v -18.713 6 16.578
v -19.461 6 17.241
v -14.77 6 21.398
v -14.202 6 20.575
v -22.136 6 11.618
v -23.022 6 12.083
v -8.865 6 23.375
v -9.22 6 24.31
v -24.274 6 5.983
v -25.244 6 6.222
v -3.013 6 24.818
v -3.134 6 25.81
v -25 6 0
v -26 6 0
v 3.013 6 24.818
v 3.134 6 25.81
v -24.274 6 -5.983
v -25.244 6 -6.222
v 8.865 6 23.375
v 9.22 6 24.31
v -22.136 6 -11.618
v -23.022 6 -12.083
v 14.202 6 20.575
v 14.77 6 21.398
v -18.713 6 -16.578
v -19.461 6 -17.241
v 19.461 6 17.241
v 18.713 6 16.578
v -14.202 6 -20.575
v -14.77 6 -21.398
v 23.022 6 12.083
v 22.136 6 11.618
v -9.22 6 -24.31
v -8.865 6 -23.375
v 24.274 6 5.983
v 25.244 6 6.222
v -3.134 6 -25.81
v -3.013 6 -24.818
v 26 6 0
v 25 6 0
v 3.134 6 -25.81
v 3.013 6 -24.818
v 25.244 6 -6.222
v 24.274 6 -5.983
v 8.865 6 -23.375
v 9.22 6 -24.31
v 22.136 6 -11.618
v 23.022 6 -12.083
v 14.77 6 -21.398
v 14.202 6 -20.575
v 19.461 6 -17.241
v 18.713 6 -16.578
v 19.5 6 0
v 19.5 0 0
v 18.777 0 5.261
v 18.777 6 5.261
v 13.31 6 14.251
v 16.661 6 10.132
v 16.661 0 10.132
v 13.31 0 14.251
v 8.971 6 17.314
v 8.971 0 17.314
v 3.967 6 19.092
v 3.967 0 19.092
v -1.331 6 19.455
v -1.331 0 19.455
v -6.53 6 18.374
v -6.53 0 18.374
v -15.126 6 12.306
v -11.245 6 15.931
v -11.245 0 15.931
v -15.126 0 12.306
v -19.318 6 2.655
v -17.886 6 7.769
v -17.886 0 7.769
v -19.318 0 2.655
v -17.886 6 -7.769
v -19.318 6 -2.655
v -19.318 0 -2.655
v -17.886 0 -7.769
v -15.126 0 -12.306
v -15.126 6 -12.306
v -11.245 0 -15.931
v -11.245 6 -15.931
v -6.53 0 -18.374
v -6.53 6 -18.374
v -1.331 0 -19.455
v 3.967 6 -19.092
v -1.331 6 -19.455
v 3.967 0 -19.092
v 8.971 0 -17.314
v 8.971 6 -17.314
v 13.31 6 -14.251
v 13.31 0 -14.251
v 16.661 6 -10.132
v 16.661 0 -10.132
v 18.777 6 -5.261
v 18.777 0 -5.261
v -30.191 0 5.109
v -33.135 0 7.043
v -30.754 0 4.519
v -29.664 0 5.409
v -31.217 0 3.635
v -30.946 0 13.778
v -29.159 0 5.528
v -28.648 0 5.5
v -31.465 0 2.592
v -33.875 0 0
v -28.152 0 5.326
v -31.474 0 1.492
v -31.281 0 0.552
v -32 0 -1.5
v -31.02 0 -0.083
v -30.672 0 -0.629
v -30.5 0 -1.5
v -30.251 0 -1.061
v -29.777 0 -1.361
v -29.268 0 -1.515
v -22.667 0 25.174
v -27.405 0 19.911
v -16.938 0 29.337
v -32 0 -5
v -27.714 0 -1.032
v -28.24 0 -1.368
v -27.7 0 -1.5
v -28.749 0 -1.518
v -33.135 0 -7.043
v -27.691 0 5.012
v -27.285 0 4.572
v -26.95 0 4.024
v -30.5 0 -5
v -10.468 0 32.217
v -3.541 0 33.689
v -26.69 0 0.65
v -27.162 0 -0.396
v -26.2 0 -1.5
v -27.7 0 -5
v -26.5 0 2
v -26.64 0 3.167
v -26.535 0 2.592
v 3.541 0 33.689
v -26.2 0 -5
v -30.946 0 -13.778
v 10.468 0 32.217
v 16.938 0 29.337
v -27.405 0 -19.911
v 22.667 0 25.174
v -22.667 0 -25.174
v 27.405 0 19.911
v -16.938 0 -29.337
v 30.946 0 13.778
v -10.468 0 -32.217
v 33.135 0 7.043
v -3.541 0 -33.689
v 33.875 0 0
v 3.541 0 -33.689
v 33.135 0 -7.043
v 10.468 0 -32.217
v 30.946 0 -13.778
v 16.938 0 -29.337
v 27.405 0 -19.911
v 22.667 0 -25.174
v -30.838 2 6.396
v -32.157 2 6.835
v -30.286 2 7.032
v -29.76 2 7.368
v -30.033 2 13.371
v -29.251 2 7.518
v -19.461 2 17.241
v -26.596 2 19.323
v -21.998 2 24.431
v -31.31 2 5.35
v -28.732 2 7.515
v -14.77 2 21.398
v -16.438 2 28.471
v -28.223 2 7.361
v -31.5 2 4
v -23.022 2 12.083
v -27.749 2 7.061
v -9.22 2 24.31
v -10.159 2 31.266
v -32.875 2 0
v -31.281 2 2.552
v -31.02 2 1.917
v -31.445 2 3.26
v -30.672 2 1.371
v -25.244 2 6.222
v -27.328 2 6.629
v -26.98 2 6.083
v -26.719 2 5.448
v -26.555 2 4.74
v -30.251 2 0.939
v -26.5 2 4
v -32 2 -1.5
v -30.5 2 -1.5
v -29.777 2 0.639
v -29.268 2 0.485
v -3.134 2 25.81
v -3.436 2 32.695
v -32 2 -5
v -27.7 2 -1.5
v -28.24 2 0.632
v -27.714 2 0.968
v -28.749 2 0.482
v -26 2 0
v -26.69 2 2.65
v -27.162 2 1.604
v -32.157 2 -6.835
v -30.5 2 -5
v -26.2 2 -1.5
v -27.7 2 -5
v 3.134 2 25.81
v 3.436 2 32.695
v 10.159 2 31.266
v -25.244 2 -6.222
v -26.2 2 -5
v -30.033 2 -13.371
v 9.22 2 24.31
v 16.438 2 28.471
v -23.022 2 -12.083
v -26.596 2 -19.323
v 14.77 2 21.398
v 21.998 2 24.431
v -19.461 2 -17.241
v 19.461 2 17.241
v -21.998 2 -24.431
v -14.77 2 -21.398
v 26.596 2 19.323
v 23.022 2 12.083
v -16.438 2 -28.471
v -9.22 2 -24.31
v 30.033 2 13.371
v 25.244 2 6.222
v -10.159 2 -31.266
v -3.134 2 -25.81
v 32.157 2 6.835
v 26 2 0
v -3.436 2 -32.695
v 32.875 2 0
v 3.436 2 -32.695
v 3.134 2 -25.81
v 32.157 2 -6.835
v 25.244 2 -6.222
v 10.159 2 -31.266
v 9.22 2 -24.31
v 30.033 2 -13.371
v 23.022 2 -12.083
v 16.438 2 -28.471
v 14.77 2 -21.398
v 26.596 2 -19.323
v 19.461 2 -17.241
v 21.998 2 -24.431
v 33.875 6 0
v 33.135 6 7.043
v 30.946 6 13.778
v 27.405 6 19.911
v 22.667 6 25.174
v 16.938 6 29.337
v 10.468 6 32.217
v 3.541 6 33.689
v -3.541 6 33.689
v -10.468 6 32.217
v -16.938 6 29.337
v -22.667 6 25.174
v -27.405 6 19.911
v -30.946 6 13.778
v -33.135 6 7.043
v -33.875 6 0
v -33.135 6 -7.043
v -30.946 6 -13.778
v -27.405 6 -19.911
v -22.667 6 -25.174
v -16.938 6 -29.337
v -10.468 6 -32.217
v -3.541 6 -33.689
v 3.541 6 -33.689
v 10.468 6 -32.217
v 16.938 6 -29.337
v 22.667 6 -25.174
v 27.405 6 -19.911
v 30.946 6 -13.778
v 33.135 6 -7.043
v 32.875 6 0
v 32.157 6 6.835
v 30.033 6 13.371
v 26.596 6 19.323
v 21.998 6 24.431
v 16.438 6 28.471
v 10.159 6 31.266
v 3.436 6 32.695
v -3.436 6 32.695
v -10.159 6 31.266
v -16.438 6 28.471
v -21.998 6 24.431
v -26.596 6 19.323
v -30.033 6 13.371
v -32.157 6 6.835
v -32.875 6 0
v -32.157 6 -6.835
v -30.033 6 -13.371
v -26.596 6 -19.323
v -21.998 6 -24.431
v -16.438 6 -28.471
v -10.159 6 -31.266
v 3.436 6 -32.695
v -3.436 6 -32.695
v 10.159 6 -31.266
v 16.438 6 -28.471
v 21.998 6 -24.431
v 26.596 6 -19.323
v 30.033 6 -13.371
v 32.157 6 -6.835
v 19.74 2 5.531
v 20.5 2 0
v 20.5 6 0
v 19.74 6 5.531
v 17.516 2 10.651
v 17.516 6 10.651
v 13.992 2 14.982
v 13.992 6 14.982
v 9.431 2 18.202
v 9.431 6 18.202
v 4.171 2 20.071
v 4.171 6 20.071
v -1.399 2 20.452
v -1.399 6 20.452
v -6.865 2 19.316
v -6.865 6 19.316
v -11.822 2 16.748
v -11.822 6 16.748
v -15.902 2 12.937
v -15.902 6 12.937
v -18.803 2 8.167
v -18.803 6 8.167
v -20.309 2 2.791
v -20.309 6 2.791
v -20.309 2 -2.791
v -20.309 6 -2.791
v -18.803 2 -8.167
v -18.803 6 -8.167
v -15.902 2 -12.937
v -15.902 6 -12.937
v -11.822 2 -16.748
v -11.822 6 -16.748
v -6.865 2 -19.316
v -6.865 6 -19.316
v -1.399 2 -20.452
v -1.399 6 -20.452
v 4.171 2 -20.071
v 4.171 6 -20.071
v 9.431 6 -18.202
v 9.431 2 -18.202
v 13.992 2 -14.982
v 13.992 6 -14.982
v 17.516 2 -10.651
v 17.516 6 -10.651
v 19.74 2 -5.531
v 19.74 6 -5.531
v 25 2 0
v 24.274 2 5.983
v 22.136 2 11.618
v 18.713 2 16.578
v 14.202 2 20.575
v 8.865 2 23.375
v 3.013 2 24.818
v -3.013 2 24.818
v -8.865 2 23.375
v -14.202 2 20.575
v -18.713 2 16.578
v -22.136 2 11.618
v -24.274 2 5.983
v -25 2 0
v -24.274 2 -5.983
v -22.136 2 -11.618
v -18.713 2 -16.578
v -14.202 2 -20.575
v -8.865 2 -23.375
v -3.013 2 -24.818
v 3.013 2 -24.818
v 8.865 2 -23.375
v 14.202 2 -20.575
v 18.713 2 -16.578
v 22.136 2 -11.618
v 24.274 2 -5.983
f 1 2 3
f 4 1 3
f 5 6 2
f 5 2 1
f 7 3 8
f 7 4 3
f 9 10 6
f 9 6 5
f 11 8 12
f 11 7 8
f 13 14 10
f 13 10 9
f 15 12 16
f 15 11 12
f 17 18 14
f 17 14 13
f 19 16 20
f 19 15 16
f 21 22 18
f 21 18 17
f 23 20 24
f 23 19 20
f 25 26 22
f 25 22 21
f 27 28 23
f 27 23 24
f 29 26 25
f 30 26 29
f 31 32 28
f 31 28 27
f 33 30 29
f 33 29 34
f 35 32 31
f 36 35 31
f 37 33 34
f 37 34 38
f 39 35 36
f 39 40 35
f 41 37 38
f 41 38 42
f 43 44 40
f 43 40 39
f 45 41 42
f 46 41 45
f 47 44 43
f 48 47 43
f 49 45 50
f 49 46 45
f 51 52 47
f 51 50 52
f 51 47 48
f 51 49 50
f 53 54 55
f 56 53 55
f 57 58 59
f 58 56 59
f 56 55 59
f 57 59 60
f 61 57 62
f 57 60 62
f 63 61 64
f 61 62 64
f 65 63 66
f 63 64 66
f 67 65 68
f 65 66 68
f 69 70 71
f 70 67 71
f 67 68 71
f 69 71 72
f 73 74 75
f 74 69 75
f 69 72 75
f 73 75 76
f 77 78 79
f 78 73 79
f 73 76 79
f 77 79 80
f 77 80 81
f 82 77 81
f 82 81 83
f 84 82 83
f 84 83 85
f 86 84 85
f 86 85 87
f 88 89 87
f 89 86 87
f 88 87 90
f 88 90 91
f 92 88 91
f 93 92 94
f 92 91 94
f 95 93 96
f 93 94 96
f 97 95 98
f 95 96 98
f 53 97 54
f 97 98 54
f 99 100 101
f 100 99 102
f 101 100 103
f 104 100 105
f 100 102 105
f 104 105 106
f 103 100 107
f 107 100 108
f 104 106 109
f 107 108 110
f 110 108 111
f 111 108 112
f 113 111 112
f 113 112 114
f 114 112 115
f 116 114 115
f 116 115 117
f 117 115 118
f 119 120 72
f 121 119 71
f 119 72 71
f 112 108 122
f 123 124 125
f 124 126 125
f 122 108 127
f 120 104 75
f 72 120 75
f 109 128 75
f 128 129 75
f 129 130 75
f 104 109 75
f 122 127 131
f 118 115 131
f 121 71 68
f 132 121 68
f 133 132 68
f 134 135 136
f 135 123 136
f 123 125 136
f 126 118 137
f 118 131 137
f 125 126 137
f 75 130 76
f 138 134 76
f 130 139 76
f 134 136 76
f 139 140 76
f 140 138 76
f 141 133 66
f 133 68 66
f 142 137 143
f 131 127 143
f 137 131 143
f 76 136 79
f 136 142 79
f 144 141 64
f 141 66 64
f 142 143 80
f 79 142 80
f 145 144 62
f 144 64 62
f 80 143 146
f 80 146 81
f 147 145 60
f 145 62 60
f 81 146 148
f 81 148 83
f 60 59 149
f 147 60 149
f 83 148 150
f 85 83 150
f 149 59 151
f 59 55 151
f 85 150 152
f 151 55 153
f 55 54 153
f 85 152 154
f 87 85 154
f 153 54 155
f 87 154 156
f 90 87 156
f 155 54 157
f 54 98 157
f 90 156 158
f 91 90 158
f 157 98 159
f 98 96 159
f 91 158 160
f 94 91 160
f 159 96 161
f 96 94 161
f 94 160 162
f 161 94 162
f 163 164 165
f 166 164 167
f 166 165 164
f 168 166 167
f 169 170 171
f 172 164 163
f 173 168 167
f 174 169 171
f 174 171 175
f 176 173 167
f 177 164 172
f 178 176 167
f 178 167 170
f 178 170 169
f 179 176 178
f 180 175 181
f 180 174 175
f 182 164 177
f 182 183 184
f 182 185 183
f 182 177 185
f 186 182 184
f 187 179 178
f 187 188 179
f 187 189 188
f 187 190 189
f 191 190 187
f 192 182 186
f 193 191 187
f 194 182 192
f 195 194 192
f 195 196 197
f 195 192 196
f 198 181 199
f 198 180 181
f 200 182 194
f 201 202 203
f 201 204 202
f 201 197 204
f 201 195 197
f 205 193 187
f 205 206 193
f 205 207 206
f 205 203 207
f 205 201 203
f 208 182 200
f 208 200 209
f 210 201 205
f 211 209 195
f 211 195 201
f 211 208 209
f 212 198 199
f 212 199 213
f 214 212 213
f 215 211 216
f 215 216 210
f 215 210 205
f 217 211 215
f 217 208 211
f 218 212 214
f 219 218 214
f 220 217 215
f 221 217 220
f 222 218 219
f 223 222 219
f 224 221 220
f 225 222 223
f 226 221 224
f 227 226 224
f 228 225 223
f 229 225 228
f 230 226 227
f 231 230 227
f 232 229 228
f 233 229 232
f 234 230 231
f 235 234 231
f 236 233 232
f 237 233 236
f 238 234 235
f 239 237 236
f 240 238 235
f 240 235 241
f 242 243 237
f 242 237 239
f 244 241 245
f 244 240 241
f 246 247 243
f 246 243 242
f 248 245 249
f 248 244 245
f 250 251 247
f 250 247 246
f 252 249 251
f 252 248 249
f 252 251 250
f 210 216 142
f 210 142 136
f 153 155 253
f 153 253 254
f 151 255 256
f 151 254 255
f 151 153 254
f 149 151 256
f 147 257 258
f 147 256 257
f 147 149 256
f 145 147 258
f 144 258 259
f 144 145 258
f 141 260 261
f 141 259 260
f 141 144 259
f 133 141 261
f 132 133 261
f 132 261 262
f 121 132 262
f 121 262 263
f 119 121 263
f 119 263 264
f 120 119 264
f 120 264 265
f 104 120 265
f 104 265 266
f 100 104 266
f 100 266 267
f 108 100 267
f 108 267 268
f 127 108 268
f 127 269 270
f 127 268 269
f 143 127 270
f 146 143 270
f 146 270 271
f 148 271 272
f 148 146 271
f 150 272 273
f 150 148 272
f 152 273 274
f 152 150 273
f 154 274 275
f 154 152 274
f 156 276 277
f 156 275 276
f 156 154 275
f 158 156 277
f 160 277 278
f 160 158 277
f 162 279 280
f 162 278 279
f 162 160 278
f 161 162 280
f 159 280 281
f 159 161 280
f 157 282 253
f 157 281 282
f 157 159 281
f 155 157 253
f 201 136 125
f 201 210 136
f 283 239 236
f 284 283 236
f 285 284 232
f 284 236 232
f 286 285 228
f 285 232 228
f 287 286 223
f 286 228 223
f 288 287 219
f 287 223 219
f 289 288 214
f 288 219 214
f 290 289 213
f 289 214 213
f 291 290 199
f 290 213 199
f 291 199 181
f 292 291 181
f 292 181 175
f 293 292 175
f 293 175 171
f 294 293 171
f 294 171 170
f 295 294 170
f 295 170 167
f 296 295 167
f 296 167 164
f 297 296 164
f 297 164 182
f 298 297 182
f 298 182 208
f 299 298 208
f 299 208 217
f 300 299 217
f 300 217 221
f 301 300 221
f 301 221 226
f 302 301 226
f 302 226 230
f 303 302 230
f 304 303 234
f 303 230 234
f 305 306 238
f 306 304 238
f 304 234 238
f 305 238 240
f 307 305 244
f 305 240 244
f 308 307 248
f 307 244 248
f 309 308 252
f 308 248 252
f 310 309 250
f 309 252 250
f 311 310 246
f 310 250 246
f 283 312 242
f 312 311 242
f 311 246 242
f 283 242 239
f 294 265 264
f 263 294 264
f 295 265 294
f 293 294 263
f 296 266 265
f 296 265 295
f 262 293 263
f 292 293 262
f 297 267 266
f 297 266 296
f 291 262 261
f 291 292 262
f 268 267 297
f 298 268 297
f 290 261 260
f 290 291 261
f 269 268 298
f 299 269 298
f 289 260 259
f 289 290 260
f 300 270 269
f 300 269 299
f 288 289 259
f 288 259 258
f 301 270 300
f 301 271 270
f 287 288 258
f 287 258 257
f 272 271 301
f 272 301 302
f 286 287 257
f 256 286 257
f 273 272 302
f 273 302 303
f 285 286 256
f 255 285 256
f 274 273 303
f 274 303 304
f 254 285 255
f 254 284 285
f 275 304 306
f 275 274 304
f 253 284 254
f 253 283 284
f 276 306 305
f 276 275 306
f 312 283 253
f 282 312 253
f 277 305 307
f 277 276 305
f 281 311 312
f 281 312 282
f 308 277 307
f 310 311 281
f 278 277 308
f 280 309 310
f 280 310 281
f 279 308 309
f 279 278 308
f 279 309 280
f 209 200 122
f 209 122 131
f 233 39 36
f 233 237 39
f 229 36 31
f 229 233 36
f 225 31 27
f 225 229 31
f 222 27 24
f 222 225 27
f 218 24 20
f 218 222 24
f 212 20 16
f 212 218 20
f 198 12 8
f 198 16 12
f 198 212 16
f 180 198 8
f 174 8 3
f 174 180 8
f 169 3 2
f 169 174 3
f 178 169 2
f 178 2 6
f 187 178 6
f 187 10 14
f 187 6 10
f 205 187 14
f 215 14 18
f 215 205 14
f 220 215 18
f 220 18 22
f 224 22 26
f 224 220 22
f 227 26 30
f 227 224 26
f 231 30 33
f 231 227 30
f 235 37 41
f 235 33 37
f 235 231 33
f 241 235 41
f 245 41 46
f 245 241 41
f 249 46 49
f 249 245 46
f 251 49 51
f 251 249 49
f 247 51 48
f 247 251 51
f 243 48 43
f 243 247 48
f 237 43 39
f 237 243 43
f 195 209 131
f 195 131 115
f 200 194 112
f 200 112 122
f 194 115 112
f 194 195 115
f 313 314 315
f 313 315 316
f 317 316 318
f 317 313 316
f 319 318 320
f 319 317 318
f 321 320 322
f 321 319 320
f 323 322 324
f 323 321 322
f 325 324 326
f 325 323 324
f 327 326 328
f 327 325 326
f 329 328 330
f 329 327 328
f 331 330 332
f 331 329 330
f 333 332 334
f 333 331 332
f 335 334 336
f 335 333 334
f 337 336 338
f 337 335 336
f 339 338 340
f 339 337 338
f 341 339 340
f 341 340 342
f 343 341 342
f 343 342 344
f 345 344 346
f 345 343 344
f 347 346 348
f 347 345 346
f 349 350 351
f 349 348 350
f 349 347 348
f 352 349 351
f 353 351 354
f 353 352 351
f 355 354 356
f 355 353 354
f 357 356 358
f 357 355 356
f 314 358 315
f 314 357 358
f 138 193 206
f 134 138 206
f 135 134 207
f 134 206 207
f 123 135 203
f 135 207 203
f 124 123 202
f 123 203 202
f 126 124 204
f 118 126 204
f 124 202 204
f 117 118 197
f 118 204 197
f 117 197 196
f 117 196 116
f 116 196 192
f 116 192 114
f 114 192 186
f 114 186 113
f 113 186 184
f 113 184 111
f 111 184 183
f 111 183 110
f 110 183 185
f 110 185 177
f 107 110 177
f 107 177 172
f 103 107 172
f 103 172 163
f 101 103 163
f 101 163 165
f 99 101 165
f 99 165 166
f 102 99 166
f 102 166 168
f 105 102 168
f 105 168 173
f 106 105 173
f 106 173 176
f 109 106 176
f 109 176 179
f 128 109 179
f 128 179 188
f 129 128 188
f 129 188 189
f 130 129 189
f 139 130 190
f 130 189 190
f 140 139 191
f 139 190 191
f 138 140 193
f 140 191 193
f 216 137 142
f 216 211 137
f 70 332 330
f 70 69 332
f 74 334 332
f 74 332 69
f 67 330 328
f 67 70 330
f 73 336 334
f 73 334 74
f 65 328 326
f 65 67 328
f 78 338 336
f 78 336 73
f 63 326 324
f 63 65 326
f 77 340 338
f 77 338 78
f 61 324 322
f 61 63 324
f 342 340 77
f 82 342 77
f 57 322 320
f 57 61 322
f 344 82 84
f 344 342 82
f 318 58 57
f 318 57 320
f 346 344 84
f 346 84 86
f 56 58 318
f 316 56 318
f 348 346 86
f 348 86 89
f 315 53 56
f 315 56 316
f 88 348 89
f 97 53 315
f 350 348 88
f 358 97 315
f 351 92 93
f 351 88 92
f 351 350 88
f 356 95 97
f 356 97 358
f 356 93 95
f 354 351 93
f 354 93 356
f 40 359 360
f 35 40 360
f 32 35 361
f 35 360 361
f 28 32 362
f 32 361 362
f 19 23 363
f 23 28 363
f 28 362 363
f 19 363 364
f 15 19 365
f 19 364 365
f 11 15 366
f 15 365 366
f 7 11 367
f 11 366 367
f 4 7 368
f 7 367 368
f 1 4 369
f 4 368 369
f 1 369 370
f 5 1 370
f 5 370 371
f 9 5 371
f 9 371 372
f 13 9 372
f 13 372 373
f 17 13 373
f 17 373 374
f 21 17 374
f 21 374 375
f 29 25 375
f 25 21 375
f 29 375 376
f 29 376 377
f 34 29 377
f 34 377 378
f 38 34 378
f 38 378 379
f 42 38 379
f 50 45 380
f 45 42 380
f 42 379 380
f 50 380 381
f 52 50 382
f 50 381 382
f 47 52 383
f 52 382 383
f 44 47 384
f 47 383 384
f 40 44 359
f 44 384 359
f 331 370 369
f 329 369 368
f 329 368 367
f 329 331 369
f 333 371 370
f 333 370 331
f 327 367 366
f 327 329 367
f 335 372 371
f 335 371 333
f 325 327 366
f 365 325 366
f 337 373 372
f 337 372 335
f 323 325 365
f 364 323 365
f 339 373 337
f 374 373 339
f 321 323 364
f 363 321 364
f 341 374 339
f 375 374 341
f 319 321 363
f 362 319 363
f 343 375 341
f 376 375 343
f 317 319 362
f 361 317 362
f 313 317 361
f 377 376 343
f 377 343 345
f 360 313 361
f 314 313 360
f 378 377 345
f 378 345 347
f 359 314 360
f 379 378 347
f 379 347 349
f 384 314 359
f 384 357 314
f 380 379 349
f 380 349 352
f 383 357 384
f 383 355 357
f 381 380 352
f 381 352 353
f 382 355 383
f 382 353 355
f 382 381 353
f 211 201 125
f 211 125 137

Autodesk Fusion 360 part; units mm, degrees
sketch "Sketch1" plane through (0, 0, 0) normal (0, 1, 0) x (1, 0, 0)
  circle A0 centre (0, 0) radius 26
  circle A1 centre (0, 0) radius 32.875
  circle A2 centre (0, 0) radius 25
  circle A3 centre (0, 0) radius 33.875
  circle A4 centre (0, 0) radius 19.5
  circle A5 centre (0, 0) radius 20.5
  dimension "d1" = 67.75
  dimension "d2" = 50
  dimension "d3" = 52
  dimension "d4" = 65.75
  dimension "d10" = 39
  dimension "d25" = 41
extrude "Extrude1" add sketch "Sketch1" along normal blind 2 contours A1 | A2 | A5 makes body 1 at (30.3641, 0, 2.925) makes body 2 at (23.0736, 0, 1.242)
extrude "Extrude2" add sketch "Sketch1" along normal blind 6 bodies 2 1
sketch "Sketch2" plane through (0, 2, 0) normal (0, 1, 0) x (-1, 0, 0)
  circle A0 centre (0, 0) radius 26
  circle A1 centre (0, 0) radius 32.875
  line L0 (32, -5) -> (30.5, -5)
  line L1 (30.5, -5) -> (30.5, -1.5)
  line L2 (30.5, -1.5) -> (32, -1.5)
  line L3 (32, -1.5) -> (32, -5)
  line L4 (26.2, -1.5) -> (27.7, -1.5)
  line L5 (27.7, -1.5) -> (27.7, -5)
  line L6 (27.7, -5) -> (26.2, -5)
  line L7 (26.2, -5) -> (26.2, -1.5)
  line L8 (32, 4) -> (26, 4)
  dimension "d13" = 1.5
  dimension "d14" = 3.5
  dimension "d15" = 1.5
  dimension "d16" = 3.5
extrude "Extrude3" cut sketch "Sketch2" against normal blind 2 contours L0 L1 L2 L3 | L4 L5 L6 L7 bodies 2
ref_plane "WorkPlane1" through (-29, 2, 4) normal (0, 0.7071, 0.7071) x (1, 0, 0)
sketch "Sketch4" plane through (-29, 2, 4) normal (0, 0.7071, 0.7071) x (1, 0, 0)
  circle A0 centre (0, 0) radius 2.5
  dimension "d20" = 5
extrude "Extrude4" cut sketch "Sketch4" along normal blind 10 and the other way blind 10 bodies 2
sketch "Sketch3" plane through (0, 2, 0) normal (0, 1, 0) x (-1, 0, 0)
  line L0 (30.5, -4) -> (30.5, -0.5)
  line L1 (30.5, -0.5) -> (32, -0.5)
  line L2 (32, -0.5) -> (32, -4)
  line L3 (32, -4) -> (30.5, -4)
  line L4 (27.7, -0.5) -> (27.7, -4)
  line L5 (27.7, -4) -> (26.2, -4)
  line L6 (26.2, -4) -> (26.2, -0.5)
  line L7 (26.2, -0.5) -> (27.7, -0.5)
  circle A0 centre (0, 0) radius 26
  circle A1 centre (0, 0) radius 33
